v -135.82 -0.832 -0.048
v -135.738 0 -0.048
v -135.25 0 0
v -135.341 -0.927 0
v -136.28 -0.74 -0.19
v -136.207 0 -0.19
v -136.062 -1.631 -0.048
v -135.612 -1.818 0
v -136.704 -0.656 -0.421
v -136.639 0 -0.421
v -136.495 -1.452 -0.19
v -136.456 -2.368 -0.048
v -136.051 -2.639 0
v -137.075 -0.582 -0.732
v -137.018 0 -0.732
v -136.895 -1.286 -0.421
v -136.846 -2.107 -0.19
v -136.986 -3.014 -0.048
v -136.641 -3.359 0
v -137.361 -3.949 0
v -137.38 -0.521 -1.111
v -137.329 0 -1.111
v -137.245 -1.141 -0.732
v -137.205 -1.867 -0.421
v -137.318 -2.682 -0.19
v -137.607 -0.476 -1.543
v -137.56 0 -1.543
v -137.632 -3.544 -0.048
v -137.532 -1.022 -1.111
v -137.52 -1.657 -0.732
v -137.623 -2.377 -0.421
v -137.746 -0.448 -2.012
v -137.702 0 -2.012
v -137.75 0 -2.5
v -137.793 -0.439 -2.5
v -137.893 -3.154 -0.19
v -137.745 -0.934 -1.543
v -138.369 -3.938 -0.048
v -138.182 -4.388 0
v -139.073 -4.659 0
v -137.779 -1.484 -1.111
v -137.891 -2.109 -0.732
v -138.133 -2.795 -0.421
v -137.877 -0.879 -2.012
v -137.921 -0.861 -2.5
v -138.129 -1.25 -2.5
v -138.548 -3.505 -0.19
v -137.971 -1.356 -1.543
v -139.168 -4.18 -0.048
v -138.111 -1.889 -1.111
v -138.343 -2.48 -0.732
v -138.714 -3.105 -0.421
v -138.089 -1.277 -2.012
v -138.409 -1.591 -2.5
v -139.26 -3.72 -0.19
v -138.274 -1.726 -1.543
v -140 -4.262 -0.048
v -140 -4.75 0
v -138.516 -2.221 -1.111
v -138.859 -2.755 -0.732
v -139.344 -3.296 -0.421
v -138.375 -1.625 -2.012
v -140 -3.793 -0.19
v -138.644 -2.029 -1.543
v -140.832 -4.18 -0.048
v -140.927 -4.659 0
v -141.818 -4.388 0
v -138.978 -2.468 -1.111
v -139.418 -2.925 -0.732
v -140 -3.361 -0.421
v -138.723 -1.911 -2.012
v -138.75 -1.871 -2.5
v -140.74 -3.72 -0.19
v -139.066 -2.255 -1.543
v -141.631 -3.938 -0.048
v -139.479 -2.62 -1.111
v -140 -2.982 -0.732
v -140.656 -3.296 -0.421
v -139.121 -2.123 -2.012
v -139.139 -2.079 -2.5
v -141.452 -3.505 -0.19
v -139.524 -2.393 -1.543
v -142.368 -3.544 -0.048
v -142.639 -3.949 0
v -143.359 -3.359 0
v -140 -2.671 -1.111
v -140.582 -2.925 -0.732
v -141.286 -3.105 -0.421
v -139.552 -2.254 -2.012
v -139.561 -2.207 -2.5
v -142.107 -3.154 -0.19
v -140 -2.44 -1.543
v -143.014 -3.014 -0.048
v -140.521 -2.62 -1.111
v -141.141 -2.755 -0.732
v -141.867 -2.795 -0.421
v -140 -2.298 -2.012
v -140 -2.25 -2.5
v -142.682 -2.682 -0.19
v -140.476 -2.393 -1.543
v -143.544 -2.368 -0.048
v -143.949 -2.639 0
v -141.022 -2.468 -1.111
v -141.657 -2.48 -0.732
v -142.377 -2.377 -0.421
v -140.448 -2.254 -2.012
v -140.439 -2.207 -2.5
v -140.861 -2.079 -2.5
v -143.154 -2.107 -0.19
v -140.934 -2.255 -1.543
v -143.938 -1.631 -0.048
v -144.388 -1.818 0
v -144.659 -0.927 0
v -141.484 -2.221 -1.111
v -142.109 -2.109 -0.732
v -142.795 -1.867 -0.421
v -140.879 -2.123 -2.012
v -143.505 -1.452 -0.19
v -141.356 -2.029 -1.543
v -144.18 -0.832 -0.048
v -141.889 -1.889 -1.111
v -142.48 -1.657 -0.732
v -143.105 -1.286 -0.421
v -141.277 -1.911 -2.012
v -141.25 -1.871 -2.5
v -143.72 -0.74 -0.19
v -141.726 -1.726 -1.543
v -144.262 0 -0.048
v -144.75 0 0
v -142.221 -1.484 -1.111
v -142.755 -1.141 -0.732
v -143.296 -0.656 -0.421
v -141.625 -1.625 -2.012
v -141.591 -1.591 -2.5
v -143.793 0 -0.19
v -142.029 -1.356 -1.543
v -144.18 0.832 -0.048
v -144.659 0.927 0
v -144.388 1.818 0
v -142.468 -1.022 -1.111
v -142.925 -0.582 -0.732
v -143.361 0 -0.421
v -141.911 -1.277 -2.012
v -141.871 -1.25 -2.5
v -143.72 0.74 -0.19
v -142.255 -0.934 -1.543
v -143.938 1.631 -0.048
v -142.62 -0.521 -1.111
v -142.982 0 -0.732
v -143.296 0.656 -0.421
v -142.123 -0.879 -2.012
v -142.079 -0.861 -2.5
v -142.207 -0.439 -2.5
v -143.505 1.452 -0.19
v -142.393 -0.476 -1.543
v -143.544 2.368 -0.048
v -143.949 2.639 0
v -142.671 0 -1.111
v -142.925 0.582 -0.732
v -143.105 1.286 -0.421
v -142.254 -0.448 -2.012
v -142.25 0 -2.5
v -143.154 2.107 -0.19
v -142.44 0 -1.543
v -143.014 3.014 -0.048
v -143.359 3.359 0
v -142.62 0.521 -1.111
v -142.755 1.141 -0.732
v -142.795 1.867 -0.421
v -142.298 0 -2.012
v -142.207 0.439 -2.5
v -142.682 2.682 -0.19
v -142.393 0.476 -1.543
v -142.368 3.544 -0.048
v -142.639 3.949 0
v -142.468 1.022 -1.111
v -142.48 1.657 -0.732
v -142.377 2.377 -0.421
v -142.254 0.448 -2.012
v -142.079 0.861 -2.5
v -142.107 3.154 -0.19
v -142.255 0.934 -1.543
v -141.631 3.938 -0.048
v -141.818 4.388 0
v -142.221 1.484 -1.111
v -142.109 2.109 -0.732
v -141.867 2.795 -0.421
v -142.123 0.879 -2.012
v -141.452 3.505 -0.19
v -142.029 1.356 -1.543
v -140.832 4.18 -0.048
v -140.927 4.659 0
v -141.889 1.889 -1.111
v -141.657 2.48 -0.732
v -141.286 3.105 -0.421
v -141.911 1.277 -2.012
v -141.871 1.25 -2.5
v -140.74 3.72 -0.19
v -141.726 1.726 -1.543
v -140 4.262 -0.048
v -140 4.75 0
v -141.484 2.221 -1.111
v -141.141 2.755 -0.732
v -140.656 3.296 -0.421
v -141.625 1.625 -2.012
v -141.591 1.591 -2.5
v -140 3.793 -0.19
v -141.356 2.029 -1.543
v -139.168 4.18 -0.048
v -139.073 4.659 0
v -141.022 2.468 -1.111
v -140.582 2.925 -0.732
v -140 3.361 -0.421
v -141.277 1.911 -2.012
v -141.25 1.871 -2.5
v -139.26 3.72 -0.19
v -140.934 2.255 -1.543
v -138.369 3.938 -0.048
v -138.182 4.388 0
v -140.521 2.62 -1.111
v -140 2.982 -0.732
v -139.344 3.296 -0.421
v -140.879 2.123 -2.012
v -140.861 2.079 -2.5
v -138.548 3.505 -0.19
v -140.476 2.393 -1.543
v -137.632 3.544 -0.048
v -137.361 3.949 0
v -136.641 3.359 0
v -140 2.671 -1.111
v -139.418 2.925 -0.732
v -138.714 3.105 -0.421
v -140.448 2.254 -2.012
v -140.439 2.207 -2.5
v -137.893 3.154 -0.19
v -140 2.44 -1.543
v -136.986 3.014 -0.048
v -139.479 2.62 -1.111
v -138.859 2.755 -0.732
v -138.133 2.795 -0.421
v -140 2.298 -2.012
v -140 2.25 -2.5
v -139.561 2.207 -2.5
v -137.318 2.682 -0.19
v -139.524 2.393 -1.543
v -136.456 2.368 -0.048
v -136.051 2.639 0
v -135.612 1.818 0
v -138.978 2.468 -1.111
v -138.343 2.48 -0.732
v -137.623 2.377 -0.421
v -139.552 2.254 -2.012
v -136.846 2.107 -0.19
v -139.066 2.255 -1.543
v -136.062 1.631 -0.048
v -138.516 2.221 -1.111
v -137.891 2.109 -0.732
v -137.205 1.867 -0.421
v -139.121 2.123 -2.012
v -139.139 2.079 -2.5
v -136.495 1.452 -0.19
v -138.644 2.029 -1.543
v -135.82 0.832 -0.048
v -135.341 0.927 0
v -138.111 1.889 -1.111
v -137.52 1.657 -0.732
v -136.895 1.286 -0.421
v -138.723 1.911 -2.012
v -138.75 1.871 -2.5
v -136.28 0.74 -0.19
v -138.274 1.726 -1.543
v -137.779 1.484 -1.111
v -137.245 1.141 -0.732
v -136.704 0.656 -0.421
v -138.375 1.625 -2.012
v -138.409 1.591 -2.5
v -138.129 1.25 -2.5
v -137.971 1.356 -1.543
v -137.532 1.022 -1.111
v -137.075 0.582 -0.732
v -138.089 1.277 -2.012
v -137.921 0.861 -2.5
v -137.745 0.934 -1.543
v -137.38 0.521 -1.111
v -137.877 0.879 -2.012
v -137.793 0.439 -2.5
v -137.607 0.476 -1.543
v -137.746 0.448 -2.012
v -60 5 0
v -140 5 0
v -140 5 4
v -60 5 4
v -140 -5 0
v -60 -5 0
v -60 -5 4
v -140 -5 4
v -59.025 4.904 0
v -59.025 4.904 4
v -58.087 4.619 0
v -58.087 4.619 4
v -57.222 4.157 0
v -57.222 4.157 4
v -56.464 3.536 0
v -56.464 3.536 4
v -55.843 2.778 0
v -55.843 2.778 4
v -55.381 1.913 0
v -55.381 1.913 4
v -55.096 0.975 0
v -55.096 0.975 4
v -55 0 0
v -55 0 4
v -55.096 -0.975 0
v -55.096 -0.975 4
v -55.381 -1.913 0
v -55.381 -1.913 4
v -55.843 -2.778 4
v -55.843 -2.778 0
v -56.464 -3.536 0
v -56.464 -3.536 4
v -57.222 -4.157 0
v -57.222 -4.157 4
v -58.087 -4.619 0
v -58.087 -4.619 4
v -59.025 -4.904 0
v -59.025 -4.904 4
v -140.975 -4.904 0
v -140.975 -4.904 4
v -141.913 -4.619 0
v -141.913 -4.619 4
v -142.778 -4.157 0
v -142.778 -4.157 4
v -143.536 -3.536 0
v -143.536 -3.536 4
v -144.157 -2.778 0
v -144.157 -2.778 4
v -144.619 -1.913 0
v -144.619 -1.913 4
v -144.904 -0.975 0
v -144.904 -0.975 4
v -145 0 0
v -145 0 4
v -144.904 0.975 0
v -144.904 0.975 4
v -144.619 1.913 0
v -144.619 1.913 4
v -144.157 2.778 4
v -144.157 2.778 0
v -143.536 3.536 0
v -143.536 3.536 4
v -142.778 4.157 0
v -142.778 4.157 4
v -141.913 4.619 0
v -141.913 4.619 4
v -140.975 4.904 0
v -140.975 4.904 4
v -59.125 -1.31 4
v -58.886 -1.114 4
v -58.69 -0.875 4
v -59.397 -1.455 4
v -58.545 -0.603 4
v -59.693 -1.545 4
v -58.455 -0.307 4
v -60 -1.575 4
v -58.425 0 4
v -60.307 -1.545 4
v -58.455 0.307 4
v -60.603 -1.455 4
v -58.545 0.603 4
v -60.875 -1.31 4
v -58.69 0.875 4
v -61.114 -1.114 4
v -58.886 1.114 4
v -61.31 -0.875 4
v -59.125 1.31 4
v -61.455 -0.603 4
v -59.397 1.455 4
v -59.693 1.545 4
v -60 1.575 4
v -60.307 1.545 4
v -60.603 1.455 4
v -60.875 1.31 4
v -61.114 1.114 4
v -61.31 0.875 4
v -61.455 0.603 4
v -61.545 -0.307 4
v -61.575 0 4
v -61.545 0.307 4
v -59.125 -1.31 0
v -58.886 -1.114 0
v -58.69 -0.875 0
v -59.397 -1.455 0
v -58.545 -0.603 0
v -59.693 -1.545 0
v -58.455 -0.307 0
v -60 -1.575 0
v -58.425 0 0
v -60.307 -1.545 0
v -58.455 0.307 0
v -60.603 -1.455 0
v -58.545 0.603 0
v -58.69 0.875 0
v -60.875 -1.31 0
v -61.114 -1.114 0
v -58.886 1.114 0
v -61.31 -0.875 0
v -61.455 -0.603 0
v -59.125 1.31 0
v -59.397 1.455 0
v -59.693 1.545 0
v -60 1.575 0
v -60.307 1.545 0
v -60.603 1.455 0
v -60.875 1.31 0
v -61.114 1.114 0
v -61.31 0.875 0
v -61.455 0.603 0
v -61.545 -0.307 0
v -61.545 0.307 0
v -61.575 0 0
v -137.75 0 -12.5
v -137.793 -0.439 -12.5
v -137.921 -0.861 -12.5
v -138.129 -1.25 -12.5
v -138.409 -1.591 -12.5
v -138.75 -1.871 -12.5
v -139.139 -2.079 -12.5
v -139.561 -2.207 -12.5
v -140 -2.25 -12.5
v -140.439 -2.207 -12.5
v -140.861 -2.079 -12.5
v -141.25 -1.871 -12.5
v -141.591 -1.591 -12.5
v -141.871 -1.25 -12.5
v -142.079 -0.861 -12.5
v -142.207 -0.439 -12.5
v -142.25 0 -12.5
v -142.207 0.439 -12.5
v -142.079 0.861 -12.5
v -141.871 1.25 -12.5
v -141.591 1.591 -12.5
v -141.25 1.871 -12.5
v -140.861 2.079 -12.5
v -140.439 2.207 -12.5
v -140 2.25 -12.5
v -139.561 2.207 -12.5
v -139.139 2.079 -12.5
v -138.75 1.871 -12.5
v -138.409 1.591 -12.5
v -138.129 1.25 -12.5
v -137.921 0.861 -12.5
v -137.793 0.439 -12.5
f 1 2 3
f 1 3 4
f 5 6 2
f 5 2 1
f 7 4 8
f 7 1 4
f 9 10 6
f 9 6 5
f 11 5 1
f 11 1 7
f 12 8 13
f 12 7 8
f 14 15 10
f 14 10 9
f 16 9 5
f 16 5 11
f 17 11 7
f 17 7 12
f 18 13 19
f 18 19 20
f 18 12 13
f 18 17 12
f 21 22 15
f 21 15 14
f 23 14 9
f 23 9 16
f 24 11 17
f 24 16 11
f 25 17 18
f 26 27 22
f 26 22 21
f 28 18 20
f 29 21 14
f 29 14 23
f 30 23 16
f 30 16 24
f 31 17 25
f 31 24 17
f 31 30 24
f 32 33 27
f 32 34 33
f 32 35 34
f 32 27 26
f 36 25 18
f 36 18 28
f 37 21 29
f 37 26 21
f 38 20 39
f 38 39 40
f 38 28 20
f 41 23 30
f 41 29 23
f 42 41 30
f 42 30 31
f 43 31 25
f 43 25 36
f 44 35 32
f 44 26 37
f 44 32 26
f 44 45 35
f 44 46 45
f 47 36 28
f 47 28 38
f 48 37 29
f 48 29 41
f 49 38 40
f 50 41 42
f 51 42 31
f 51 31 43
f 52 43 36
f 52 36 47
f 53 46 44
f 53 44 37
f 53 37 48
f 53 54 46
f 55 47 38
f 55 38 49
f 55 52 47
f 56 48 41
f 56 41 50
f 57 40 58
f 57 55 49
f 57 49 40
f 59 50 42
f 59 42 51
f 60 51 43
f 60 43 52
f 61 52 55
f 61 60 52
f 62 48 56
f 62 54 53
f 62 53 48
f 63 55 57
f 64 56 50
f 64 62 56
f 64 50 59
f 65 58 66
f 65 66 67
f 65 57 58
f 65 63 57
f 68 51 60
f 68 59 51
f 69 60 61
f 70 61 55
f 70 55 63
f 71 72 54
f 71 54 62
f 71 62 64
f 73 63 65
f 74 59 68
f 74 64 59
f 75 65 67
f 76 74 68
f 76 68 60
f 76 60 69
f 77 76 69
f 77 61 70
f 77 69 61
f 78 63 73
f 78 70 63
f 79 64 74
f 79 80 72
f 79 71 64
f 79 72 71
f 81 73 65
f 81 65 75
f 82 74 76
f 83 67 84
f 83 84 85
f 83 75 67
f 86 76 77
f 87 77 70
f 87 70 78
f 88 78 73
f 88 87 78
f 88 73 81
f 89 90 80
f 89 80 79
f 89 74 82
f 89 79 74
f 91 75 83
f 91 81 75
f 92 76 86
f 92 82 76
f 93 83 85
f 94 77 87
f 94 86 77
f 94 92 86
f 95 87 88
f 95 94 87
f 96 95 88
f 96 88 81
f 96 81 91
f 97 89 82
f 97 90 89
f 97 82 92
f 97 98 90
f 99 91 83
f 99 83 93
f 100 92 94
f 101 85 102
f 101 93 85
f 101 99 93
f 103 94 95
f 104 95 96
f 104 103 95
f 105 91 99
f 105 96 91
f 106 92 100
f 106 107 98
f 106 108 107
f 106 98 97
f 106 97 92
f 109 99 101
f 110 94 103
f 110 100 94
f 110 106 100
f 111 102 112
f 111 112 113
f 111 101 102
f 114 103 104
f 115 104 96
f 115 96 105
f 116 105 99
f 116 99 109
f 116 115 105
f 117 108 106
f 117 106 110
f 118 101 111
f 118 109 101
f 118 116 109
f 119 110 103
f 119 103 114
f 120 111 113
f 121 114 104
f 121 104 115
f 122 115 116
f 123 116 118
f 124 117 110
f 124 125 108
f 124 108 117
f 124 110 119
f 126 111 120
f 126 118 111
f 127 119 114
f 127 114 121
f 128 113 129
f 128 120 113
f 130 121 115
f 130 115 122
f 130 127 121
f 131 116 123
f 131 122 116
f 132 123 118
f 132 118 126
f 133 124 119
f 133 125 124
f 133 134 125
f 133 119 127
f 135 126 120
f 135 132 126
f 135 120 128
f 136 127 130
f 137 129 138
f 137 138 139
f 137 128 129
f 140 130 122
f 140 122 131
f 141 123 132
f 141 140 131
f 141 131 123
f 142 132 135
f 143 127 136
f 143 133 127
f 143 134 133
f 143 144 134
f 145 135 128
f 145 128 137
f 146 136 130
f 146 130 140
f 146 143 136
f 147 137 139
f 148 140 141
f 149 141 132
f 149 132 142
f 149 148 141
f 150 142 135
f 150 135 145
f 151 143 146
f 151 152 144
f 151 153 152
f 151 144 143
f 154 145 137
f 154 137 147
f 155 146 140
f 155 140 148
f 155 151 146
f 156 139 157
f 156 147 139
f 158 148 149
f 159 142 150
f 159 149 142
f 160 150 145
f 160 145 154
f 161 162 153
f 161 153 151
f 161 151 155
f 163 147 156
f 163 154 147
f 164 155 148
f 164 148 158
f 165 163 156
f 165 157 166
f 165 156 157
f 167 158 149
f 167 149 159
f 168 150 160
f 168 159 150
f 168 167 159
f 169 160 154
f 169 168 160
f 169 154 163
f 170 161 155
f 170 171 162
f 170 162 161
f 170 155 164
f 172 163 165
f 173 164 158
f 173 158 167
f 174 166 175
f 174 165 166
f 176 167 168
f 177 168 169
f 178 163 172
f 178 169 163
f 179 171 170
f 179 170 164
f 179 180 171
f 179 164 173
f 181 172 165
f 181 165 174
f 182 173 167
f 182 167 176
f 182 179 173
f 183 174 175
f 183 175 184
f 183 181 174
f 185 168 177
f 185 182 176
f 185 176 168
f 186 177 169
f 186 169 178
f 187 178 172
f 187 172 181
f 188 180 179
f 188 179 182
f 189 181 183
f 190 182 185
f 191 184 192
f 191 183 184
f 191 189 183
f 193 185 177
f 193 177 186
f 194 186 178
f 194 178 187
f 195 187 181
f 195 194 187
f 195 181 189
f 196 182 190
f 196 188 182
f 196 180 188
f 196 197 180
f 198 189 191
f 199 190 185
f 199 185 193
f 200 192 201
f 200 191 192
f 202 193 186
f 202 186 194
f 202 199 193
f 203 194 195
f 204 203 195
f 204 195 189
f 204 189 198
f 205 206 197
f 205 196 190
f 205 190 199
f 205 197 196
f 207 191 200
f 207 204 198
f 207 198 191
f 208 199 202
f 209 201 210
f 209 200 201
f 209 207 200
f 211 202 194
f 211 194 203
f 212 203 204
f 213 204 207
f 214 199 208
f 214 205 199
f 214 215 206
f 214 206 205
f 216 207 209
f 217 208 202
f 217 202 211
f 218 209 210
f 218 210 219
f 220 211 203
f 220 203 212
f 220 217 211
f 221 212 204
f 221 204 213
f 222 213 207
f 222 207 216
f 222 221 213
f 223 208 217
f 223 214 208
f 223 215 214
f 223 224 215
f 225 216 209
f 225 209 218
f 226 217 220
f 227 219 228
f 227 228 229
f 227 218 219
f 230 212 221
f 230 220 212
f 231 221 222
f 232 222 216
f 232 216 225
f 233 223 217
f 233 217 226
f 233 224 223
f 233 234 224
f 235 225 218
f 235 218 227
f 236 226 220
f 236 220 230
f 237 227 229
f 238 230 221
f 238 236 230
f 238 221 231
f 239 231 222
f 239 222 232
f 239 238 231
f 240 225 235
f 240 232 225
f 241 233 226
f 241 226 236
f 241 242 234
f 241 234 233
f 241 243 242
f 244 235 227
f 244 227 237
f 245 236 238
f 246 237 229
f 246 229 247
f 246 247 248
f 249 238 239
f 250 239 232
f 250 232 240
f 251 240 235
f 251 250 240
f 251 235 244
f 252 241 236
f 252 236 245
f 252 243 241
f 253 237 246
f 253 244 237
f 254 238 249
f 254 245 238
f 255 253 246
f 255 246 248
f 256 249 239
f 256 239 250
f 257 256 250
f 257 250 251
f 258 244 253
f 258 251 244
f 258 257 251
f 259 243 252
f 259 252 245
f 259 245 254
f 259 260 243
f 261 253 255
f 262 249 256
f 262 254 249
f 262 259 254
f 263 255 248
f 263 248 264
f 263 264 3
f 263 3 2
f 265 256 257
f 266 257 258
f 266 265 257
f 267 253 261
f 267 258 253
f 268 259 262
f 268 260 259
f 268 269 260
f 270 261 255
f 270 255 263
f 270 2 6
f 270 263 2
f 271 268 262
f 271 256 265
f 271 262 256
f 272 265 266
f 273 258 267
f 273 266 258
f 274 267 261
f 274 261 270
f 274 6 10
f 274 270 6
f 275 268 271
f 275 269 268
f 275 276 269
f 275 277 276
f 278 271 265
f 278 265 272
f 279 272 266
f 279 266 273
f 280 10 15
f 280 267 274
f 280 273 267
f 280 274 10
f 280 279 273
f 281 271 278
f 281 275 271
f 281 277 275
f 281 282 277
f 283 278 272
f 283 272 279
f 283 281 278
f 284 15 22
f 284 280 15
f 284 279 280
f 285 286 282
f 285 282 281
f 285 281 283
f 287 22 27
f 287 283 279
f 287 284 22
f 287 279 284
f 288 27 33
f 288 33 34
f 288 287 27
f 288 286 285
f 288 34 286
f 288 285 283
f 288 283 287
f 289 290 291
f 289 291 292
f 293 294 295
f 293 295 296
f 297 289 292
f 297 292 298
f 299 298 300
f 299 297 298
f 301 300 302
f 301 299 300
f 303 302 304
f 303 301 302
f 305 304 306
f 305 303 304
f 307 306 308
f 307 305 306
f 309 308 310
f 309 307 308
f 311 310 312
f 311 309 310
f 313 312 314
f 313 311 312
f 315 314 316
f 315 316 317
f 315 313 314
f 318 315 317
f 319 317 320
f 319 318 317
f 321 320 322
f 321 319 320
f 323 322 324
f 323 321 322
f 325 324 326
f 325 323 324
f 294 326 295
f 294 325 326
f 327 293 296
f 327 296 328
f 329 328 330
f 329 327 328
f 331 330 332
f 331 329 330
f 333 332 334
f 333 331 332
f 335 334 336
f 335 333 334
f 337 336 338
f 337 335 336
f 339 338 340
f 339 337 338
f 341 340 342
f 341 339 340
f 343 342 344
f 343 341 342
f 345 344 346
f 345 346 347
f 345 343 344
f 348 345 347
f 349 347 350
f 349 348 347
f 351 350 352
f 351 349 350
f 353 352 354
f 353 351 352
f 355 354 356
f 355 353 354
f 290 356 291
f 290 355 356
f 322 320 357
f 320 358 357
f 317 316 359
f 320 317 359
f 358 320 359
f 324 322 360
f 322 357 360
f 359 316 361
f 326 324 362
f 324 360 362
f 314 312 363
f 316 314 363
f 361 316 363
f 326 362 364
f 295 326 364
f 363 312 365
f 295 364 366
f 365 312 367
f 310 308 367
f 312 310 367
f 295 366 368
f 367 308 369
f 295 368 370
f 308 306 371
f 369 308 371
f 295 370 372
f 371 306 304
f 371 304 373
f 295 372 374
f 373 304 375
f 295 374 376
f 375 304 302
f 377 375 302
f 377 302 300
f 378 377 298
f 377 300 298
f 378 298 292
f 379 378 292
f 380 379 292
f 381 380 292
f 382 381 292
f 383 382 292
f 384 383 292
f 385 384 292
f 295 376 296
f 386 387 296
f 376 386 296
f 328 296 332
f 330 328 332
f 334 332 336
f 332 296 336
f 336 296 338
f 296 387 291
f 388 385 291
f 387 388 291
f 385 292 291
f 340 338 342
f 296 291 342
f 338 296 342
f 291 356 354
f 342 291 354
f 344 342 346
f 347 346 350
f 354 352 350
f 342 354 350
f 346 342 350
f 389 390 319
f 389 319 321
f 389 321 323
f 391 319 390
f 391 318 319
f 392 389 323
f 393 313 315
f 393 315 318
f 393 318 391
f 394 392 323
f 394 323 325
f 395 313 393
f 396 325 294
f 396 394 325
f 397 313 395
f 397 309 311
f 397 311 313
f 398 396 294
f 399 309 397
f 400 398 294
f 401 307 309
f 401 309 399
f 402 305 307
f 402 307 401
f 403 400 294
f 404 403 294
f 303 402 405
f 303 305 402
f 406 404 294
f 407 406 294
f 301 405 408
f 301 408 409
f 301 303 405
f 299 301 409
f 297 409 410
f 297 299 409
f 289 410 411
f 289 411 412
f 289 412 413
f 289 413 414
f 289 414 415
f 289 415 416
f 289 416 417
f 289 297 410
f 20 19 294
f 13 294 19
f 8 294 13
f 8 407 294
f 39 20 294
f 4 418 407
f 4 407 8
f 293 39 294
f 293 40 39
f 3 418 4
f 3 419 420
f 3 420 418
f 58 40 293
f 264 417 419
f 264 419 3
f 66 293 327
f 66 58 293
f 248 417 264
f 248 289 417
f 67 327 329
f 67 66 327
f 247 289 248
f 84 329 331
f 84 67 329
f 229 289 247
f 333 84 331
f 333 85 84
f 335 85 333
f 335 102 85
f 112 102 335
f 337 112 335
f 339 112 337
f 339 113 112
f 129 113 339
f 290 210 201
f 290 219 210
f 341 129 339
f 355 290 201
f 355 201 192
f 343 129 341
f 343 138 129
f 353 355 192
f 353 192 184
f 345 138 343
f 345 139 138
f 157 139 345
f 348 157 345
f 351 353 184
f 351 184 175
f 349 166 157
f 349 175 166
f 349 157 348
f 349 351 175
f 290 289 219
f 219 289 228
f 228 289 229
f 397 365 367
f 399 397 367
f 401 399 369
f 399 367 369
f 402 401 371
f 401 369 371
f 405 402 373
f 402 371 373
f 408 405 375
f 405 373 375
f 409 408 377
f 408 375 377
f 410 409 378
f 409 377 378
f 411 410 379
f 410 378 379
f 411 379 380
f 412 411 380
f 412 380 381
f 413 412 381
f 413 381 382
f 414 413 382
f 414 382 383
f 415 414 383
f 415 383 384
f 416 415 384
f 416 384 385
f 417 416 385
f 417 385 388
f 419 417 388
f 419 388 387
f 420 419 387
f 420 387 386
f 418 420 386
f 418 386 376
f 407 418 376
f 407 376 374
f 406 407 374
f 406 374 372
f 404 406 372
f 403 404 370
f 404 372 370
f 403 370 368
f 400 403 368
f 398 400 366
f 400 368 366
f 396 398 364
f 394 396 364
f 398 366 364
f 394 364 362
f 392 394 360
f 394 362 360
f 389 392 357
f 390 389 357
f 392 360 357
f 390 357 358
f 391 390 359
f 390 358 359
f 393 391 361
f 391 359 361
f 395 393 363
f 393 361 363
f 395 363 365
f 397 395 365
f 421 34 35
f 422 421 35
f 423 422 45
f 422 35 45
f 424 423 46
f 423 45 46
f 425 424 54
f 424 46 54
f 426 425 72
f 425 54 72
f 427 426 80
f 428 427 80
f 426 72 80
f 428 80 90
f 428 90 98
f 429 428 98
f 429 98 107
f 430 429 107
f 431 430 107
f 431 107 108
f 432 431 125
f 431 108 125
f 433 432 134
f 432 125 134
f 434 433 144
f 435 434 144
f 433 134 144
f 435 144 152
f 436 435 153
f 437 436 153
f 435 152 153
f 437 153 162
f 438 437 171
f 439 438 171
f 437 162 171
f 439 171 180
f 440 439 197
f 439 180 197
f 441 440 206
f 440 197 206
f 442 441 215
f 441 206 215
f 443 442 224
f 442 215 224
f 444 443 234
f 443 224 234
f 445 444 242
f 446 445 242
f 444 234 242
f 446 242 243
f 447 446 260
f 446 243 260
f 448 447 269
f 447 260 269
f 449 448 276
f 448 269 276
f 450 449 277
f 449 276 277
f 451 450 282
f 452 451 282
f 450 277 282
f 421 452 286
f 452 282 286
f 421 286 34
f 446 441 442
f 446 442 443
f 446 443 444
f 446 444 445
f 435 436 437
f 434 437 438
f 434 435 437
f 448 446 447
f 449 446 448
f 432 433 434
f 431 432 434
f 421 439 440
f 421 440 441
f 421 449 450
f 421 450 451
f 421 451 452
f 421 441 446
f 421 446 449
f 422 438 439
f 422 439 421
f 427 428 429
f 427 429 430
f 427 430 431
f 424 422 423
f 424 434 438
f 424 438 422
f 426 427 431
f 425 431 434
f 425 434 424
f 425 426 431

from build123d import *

# Parameters (mm, degrees)
BOSS_EXTRUDE1_DEPTH = 4
SKETCH2_R           = 2.25
BOSS_EXTRUDE2_DEPTH = 12.5
FILLET1_R           = 2.5
SKETCH4_R           = 1.575
CUT_EXTRUDE1_DEPTH  = 147.021402541


with BuildPart() as part:
    # Sketch1 → Boss-Extrude1 (new body)
    with BuildSketch(Plane.XY):
        with BuildLine():
            Line((-60, -5), (-140, -5))
            ThreePointArc((-140, -5), (-145, 0), (-140, 5))
            Line((-140, 5), (-60, 5))
            ThreePointArc((-60, 5), (-55, 0), (-60, -5))
        make_face()
    extrude(amount=BOSS_EXTRUDE1_DEPTH)

    # Sketch2 → Boss-Extrude2 (add)
    with BuildSketch(Plane(origin=(0, 0, 0), x_dir=(-1, 0, 0), z_dir=(0, 0, -1))):
        with Locations((140, 0)):
            Circle(SKETCH2_R)
    extrude(amount=BOSS_EXTRUDE2_DEPTH)

    # Fillet1
    fillet1_edges = [part.edges().sort_by_distance(p)[0] for p in [
        (-137.75, 0, 0),
    ]]
    fillet(fillet1_edges, radius=FILLET1_R)

    # Sketch4 → Cut-Extrude1 (cut, through all)
    with BuildSketch(Plane.XY.offset(4)):
        with Locations((-60, 0)):
            Circle(SKETCH4_R)
    extrude(amount=-CUT_EXTRUDE1_DEPTH, mode=Mode.SUBTRACT)


solid = part.part
